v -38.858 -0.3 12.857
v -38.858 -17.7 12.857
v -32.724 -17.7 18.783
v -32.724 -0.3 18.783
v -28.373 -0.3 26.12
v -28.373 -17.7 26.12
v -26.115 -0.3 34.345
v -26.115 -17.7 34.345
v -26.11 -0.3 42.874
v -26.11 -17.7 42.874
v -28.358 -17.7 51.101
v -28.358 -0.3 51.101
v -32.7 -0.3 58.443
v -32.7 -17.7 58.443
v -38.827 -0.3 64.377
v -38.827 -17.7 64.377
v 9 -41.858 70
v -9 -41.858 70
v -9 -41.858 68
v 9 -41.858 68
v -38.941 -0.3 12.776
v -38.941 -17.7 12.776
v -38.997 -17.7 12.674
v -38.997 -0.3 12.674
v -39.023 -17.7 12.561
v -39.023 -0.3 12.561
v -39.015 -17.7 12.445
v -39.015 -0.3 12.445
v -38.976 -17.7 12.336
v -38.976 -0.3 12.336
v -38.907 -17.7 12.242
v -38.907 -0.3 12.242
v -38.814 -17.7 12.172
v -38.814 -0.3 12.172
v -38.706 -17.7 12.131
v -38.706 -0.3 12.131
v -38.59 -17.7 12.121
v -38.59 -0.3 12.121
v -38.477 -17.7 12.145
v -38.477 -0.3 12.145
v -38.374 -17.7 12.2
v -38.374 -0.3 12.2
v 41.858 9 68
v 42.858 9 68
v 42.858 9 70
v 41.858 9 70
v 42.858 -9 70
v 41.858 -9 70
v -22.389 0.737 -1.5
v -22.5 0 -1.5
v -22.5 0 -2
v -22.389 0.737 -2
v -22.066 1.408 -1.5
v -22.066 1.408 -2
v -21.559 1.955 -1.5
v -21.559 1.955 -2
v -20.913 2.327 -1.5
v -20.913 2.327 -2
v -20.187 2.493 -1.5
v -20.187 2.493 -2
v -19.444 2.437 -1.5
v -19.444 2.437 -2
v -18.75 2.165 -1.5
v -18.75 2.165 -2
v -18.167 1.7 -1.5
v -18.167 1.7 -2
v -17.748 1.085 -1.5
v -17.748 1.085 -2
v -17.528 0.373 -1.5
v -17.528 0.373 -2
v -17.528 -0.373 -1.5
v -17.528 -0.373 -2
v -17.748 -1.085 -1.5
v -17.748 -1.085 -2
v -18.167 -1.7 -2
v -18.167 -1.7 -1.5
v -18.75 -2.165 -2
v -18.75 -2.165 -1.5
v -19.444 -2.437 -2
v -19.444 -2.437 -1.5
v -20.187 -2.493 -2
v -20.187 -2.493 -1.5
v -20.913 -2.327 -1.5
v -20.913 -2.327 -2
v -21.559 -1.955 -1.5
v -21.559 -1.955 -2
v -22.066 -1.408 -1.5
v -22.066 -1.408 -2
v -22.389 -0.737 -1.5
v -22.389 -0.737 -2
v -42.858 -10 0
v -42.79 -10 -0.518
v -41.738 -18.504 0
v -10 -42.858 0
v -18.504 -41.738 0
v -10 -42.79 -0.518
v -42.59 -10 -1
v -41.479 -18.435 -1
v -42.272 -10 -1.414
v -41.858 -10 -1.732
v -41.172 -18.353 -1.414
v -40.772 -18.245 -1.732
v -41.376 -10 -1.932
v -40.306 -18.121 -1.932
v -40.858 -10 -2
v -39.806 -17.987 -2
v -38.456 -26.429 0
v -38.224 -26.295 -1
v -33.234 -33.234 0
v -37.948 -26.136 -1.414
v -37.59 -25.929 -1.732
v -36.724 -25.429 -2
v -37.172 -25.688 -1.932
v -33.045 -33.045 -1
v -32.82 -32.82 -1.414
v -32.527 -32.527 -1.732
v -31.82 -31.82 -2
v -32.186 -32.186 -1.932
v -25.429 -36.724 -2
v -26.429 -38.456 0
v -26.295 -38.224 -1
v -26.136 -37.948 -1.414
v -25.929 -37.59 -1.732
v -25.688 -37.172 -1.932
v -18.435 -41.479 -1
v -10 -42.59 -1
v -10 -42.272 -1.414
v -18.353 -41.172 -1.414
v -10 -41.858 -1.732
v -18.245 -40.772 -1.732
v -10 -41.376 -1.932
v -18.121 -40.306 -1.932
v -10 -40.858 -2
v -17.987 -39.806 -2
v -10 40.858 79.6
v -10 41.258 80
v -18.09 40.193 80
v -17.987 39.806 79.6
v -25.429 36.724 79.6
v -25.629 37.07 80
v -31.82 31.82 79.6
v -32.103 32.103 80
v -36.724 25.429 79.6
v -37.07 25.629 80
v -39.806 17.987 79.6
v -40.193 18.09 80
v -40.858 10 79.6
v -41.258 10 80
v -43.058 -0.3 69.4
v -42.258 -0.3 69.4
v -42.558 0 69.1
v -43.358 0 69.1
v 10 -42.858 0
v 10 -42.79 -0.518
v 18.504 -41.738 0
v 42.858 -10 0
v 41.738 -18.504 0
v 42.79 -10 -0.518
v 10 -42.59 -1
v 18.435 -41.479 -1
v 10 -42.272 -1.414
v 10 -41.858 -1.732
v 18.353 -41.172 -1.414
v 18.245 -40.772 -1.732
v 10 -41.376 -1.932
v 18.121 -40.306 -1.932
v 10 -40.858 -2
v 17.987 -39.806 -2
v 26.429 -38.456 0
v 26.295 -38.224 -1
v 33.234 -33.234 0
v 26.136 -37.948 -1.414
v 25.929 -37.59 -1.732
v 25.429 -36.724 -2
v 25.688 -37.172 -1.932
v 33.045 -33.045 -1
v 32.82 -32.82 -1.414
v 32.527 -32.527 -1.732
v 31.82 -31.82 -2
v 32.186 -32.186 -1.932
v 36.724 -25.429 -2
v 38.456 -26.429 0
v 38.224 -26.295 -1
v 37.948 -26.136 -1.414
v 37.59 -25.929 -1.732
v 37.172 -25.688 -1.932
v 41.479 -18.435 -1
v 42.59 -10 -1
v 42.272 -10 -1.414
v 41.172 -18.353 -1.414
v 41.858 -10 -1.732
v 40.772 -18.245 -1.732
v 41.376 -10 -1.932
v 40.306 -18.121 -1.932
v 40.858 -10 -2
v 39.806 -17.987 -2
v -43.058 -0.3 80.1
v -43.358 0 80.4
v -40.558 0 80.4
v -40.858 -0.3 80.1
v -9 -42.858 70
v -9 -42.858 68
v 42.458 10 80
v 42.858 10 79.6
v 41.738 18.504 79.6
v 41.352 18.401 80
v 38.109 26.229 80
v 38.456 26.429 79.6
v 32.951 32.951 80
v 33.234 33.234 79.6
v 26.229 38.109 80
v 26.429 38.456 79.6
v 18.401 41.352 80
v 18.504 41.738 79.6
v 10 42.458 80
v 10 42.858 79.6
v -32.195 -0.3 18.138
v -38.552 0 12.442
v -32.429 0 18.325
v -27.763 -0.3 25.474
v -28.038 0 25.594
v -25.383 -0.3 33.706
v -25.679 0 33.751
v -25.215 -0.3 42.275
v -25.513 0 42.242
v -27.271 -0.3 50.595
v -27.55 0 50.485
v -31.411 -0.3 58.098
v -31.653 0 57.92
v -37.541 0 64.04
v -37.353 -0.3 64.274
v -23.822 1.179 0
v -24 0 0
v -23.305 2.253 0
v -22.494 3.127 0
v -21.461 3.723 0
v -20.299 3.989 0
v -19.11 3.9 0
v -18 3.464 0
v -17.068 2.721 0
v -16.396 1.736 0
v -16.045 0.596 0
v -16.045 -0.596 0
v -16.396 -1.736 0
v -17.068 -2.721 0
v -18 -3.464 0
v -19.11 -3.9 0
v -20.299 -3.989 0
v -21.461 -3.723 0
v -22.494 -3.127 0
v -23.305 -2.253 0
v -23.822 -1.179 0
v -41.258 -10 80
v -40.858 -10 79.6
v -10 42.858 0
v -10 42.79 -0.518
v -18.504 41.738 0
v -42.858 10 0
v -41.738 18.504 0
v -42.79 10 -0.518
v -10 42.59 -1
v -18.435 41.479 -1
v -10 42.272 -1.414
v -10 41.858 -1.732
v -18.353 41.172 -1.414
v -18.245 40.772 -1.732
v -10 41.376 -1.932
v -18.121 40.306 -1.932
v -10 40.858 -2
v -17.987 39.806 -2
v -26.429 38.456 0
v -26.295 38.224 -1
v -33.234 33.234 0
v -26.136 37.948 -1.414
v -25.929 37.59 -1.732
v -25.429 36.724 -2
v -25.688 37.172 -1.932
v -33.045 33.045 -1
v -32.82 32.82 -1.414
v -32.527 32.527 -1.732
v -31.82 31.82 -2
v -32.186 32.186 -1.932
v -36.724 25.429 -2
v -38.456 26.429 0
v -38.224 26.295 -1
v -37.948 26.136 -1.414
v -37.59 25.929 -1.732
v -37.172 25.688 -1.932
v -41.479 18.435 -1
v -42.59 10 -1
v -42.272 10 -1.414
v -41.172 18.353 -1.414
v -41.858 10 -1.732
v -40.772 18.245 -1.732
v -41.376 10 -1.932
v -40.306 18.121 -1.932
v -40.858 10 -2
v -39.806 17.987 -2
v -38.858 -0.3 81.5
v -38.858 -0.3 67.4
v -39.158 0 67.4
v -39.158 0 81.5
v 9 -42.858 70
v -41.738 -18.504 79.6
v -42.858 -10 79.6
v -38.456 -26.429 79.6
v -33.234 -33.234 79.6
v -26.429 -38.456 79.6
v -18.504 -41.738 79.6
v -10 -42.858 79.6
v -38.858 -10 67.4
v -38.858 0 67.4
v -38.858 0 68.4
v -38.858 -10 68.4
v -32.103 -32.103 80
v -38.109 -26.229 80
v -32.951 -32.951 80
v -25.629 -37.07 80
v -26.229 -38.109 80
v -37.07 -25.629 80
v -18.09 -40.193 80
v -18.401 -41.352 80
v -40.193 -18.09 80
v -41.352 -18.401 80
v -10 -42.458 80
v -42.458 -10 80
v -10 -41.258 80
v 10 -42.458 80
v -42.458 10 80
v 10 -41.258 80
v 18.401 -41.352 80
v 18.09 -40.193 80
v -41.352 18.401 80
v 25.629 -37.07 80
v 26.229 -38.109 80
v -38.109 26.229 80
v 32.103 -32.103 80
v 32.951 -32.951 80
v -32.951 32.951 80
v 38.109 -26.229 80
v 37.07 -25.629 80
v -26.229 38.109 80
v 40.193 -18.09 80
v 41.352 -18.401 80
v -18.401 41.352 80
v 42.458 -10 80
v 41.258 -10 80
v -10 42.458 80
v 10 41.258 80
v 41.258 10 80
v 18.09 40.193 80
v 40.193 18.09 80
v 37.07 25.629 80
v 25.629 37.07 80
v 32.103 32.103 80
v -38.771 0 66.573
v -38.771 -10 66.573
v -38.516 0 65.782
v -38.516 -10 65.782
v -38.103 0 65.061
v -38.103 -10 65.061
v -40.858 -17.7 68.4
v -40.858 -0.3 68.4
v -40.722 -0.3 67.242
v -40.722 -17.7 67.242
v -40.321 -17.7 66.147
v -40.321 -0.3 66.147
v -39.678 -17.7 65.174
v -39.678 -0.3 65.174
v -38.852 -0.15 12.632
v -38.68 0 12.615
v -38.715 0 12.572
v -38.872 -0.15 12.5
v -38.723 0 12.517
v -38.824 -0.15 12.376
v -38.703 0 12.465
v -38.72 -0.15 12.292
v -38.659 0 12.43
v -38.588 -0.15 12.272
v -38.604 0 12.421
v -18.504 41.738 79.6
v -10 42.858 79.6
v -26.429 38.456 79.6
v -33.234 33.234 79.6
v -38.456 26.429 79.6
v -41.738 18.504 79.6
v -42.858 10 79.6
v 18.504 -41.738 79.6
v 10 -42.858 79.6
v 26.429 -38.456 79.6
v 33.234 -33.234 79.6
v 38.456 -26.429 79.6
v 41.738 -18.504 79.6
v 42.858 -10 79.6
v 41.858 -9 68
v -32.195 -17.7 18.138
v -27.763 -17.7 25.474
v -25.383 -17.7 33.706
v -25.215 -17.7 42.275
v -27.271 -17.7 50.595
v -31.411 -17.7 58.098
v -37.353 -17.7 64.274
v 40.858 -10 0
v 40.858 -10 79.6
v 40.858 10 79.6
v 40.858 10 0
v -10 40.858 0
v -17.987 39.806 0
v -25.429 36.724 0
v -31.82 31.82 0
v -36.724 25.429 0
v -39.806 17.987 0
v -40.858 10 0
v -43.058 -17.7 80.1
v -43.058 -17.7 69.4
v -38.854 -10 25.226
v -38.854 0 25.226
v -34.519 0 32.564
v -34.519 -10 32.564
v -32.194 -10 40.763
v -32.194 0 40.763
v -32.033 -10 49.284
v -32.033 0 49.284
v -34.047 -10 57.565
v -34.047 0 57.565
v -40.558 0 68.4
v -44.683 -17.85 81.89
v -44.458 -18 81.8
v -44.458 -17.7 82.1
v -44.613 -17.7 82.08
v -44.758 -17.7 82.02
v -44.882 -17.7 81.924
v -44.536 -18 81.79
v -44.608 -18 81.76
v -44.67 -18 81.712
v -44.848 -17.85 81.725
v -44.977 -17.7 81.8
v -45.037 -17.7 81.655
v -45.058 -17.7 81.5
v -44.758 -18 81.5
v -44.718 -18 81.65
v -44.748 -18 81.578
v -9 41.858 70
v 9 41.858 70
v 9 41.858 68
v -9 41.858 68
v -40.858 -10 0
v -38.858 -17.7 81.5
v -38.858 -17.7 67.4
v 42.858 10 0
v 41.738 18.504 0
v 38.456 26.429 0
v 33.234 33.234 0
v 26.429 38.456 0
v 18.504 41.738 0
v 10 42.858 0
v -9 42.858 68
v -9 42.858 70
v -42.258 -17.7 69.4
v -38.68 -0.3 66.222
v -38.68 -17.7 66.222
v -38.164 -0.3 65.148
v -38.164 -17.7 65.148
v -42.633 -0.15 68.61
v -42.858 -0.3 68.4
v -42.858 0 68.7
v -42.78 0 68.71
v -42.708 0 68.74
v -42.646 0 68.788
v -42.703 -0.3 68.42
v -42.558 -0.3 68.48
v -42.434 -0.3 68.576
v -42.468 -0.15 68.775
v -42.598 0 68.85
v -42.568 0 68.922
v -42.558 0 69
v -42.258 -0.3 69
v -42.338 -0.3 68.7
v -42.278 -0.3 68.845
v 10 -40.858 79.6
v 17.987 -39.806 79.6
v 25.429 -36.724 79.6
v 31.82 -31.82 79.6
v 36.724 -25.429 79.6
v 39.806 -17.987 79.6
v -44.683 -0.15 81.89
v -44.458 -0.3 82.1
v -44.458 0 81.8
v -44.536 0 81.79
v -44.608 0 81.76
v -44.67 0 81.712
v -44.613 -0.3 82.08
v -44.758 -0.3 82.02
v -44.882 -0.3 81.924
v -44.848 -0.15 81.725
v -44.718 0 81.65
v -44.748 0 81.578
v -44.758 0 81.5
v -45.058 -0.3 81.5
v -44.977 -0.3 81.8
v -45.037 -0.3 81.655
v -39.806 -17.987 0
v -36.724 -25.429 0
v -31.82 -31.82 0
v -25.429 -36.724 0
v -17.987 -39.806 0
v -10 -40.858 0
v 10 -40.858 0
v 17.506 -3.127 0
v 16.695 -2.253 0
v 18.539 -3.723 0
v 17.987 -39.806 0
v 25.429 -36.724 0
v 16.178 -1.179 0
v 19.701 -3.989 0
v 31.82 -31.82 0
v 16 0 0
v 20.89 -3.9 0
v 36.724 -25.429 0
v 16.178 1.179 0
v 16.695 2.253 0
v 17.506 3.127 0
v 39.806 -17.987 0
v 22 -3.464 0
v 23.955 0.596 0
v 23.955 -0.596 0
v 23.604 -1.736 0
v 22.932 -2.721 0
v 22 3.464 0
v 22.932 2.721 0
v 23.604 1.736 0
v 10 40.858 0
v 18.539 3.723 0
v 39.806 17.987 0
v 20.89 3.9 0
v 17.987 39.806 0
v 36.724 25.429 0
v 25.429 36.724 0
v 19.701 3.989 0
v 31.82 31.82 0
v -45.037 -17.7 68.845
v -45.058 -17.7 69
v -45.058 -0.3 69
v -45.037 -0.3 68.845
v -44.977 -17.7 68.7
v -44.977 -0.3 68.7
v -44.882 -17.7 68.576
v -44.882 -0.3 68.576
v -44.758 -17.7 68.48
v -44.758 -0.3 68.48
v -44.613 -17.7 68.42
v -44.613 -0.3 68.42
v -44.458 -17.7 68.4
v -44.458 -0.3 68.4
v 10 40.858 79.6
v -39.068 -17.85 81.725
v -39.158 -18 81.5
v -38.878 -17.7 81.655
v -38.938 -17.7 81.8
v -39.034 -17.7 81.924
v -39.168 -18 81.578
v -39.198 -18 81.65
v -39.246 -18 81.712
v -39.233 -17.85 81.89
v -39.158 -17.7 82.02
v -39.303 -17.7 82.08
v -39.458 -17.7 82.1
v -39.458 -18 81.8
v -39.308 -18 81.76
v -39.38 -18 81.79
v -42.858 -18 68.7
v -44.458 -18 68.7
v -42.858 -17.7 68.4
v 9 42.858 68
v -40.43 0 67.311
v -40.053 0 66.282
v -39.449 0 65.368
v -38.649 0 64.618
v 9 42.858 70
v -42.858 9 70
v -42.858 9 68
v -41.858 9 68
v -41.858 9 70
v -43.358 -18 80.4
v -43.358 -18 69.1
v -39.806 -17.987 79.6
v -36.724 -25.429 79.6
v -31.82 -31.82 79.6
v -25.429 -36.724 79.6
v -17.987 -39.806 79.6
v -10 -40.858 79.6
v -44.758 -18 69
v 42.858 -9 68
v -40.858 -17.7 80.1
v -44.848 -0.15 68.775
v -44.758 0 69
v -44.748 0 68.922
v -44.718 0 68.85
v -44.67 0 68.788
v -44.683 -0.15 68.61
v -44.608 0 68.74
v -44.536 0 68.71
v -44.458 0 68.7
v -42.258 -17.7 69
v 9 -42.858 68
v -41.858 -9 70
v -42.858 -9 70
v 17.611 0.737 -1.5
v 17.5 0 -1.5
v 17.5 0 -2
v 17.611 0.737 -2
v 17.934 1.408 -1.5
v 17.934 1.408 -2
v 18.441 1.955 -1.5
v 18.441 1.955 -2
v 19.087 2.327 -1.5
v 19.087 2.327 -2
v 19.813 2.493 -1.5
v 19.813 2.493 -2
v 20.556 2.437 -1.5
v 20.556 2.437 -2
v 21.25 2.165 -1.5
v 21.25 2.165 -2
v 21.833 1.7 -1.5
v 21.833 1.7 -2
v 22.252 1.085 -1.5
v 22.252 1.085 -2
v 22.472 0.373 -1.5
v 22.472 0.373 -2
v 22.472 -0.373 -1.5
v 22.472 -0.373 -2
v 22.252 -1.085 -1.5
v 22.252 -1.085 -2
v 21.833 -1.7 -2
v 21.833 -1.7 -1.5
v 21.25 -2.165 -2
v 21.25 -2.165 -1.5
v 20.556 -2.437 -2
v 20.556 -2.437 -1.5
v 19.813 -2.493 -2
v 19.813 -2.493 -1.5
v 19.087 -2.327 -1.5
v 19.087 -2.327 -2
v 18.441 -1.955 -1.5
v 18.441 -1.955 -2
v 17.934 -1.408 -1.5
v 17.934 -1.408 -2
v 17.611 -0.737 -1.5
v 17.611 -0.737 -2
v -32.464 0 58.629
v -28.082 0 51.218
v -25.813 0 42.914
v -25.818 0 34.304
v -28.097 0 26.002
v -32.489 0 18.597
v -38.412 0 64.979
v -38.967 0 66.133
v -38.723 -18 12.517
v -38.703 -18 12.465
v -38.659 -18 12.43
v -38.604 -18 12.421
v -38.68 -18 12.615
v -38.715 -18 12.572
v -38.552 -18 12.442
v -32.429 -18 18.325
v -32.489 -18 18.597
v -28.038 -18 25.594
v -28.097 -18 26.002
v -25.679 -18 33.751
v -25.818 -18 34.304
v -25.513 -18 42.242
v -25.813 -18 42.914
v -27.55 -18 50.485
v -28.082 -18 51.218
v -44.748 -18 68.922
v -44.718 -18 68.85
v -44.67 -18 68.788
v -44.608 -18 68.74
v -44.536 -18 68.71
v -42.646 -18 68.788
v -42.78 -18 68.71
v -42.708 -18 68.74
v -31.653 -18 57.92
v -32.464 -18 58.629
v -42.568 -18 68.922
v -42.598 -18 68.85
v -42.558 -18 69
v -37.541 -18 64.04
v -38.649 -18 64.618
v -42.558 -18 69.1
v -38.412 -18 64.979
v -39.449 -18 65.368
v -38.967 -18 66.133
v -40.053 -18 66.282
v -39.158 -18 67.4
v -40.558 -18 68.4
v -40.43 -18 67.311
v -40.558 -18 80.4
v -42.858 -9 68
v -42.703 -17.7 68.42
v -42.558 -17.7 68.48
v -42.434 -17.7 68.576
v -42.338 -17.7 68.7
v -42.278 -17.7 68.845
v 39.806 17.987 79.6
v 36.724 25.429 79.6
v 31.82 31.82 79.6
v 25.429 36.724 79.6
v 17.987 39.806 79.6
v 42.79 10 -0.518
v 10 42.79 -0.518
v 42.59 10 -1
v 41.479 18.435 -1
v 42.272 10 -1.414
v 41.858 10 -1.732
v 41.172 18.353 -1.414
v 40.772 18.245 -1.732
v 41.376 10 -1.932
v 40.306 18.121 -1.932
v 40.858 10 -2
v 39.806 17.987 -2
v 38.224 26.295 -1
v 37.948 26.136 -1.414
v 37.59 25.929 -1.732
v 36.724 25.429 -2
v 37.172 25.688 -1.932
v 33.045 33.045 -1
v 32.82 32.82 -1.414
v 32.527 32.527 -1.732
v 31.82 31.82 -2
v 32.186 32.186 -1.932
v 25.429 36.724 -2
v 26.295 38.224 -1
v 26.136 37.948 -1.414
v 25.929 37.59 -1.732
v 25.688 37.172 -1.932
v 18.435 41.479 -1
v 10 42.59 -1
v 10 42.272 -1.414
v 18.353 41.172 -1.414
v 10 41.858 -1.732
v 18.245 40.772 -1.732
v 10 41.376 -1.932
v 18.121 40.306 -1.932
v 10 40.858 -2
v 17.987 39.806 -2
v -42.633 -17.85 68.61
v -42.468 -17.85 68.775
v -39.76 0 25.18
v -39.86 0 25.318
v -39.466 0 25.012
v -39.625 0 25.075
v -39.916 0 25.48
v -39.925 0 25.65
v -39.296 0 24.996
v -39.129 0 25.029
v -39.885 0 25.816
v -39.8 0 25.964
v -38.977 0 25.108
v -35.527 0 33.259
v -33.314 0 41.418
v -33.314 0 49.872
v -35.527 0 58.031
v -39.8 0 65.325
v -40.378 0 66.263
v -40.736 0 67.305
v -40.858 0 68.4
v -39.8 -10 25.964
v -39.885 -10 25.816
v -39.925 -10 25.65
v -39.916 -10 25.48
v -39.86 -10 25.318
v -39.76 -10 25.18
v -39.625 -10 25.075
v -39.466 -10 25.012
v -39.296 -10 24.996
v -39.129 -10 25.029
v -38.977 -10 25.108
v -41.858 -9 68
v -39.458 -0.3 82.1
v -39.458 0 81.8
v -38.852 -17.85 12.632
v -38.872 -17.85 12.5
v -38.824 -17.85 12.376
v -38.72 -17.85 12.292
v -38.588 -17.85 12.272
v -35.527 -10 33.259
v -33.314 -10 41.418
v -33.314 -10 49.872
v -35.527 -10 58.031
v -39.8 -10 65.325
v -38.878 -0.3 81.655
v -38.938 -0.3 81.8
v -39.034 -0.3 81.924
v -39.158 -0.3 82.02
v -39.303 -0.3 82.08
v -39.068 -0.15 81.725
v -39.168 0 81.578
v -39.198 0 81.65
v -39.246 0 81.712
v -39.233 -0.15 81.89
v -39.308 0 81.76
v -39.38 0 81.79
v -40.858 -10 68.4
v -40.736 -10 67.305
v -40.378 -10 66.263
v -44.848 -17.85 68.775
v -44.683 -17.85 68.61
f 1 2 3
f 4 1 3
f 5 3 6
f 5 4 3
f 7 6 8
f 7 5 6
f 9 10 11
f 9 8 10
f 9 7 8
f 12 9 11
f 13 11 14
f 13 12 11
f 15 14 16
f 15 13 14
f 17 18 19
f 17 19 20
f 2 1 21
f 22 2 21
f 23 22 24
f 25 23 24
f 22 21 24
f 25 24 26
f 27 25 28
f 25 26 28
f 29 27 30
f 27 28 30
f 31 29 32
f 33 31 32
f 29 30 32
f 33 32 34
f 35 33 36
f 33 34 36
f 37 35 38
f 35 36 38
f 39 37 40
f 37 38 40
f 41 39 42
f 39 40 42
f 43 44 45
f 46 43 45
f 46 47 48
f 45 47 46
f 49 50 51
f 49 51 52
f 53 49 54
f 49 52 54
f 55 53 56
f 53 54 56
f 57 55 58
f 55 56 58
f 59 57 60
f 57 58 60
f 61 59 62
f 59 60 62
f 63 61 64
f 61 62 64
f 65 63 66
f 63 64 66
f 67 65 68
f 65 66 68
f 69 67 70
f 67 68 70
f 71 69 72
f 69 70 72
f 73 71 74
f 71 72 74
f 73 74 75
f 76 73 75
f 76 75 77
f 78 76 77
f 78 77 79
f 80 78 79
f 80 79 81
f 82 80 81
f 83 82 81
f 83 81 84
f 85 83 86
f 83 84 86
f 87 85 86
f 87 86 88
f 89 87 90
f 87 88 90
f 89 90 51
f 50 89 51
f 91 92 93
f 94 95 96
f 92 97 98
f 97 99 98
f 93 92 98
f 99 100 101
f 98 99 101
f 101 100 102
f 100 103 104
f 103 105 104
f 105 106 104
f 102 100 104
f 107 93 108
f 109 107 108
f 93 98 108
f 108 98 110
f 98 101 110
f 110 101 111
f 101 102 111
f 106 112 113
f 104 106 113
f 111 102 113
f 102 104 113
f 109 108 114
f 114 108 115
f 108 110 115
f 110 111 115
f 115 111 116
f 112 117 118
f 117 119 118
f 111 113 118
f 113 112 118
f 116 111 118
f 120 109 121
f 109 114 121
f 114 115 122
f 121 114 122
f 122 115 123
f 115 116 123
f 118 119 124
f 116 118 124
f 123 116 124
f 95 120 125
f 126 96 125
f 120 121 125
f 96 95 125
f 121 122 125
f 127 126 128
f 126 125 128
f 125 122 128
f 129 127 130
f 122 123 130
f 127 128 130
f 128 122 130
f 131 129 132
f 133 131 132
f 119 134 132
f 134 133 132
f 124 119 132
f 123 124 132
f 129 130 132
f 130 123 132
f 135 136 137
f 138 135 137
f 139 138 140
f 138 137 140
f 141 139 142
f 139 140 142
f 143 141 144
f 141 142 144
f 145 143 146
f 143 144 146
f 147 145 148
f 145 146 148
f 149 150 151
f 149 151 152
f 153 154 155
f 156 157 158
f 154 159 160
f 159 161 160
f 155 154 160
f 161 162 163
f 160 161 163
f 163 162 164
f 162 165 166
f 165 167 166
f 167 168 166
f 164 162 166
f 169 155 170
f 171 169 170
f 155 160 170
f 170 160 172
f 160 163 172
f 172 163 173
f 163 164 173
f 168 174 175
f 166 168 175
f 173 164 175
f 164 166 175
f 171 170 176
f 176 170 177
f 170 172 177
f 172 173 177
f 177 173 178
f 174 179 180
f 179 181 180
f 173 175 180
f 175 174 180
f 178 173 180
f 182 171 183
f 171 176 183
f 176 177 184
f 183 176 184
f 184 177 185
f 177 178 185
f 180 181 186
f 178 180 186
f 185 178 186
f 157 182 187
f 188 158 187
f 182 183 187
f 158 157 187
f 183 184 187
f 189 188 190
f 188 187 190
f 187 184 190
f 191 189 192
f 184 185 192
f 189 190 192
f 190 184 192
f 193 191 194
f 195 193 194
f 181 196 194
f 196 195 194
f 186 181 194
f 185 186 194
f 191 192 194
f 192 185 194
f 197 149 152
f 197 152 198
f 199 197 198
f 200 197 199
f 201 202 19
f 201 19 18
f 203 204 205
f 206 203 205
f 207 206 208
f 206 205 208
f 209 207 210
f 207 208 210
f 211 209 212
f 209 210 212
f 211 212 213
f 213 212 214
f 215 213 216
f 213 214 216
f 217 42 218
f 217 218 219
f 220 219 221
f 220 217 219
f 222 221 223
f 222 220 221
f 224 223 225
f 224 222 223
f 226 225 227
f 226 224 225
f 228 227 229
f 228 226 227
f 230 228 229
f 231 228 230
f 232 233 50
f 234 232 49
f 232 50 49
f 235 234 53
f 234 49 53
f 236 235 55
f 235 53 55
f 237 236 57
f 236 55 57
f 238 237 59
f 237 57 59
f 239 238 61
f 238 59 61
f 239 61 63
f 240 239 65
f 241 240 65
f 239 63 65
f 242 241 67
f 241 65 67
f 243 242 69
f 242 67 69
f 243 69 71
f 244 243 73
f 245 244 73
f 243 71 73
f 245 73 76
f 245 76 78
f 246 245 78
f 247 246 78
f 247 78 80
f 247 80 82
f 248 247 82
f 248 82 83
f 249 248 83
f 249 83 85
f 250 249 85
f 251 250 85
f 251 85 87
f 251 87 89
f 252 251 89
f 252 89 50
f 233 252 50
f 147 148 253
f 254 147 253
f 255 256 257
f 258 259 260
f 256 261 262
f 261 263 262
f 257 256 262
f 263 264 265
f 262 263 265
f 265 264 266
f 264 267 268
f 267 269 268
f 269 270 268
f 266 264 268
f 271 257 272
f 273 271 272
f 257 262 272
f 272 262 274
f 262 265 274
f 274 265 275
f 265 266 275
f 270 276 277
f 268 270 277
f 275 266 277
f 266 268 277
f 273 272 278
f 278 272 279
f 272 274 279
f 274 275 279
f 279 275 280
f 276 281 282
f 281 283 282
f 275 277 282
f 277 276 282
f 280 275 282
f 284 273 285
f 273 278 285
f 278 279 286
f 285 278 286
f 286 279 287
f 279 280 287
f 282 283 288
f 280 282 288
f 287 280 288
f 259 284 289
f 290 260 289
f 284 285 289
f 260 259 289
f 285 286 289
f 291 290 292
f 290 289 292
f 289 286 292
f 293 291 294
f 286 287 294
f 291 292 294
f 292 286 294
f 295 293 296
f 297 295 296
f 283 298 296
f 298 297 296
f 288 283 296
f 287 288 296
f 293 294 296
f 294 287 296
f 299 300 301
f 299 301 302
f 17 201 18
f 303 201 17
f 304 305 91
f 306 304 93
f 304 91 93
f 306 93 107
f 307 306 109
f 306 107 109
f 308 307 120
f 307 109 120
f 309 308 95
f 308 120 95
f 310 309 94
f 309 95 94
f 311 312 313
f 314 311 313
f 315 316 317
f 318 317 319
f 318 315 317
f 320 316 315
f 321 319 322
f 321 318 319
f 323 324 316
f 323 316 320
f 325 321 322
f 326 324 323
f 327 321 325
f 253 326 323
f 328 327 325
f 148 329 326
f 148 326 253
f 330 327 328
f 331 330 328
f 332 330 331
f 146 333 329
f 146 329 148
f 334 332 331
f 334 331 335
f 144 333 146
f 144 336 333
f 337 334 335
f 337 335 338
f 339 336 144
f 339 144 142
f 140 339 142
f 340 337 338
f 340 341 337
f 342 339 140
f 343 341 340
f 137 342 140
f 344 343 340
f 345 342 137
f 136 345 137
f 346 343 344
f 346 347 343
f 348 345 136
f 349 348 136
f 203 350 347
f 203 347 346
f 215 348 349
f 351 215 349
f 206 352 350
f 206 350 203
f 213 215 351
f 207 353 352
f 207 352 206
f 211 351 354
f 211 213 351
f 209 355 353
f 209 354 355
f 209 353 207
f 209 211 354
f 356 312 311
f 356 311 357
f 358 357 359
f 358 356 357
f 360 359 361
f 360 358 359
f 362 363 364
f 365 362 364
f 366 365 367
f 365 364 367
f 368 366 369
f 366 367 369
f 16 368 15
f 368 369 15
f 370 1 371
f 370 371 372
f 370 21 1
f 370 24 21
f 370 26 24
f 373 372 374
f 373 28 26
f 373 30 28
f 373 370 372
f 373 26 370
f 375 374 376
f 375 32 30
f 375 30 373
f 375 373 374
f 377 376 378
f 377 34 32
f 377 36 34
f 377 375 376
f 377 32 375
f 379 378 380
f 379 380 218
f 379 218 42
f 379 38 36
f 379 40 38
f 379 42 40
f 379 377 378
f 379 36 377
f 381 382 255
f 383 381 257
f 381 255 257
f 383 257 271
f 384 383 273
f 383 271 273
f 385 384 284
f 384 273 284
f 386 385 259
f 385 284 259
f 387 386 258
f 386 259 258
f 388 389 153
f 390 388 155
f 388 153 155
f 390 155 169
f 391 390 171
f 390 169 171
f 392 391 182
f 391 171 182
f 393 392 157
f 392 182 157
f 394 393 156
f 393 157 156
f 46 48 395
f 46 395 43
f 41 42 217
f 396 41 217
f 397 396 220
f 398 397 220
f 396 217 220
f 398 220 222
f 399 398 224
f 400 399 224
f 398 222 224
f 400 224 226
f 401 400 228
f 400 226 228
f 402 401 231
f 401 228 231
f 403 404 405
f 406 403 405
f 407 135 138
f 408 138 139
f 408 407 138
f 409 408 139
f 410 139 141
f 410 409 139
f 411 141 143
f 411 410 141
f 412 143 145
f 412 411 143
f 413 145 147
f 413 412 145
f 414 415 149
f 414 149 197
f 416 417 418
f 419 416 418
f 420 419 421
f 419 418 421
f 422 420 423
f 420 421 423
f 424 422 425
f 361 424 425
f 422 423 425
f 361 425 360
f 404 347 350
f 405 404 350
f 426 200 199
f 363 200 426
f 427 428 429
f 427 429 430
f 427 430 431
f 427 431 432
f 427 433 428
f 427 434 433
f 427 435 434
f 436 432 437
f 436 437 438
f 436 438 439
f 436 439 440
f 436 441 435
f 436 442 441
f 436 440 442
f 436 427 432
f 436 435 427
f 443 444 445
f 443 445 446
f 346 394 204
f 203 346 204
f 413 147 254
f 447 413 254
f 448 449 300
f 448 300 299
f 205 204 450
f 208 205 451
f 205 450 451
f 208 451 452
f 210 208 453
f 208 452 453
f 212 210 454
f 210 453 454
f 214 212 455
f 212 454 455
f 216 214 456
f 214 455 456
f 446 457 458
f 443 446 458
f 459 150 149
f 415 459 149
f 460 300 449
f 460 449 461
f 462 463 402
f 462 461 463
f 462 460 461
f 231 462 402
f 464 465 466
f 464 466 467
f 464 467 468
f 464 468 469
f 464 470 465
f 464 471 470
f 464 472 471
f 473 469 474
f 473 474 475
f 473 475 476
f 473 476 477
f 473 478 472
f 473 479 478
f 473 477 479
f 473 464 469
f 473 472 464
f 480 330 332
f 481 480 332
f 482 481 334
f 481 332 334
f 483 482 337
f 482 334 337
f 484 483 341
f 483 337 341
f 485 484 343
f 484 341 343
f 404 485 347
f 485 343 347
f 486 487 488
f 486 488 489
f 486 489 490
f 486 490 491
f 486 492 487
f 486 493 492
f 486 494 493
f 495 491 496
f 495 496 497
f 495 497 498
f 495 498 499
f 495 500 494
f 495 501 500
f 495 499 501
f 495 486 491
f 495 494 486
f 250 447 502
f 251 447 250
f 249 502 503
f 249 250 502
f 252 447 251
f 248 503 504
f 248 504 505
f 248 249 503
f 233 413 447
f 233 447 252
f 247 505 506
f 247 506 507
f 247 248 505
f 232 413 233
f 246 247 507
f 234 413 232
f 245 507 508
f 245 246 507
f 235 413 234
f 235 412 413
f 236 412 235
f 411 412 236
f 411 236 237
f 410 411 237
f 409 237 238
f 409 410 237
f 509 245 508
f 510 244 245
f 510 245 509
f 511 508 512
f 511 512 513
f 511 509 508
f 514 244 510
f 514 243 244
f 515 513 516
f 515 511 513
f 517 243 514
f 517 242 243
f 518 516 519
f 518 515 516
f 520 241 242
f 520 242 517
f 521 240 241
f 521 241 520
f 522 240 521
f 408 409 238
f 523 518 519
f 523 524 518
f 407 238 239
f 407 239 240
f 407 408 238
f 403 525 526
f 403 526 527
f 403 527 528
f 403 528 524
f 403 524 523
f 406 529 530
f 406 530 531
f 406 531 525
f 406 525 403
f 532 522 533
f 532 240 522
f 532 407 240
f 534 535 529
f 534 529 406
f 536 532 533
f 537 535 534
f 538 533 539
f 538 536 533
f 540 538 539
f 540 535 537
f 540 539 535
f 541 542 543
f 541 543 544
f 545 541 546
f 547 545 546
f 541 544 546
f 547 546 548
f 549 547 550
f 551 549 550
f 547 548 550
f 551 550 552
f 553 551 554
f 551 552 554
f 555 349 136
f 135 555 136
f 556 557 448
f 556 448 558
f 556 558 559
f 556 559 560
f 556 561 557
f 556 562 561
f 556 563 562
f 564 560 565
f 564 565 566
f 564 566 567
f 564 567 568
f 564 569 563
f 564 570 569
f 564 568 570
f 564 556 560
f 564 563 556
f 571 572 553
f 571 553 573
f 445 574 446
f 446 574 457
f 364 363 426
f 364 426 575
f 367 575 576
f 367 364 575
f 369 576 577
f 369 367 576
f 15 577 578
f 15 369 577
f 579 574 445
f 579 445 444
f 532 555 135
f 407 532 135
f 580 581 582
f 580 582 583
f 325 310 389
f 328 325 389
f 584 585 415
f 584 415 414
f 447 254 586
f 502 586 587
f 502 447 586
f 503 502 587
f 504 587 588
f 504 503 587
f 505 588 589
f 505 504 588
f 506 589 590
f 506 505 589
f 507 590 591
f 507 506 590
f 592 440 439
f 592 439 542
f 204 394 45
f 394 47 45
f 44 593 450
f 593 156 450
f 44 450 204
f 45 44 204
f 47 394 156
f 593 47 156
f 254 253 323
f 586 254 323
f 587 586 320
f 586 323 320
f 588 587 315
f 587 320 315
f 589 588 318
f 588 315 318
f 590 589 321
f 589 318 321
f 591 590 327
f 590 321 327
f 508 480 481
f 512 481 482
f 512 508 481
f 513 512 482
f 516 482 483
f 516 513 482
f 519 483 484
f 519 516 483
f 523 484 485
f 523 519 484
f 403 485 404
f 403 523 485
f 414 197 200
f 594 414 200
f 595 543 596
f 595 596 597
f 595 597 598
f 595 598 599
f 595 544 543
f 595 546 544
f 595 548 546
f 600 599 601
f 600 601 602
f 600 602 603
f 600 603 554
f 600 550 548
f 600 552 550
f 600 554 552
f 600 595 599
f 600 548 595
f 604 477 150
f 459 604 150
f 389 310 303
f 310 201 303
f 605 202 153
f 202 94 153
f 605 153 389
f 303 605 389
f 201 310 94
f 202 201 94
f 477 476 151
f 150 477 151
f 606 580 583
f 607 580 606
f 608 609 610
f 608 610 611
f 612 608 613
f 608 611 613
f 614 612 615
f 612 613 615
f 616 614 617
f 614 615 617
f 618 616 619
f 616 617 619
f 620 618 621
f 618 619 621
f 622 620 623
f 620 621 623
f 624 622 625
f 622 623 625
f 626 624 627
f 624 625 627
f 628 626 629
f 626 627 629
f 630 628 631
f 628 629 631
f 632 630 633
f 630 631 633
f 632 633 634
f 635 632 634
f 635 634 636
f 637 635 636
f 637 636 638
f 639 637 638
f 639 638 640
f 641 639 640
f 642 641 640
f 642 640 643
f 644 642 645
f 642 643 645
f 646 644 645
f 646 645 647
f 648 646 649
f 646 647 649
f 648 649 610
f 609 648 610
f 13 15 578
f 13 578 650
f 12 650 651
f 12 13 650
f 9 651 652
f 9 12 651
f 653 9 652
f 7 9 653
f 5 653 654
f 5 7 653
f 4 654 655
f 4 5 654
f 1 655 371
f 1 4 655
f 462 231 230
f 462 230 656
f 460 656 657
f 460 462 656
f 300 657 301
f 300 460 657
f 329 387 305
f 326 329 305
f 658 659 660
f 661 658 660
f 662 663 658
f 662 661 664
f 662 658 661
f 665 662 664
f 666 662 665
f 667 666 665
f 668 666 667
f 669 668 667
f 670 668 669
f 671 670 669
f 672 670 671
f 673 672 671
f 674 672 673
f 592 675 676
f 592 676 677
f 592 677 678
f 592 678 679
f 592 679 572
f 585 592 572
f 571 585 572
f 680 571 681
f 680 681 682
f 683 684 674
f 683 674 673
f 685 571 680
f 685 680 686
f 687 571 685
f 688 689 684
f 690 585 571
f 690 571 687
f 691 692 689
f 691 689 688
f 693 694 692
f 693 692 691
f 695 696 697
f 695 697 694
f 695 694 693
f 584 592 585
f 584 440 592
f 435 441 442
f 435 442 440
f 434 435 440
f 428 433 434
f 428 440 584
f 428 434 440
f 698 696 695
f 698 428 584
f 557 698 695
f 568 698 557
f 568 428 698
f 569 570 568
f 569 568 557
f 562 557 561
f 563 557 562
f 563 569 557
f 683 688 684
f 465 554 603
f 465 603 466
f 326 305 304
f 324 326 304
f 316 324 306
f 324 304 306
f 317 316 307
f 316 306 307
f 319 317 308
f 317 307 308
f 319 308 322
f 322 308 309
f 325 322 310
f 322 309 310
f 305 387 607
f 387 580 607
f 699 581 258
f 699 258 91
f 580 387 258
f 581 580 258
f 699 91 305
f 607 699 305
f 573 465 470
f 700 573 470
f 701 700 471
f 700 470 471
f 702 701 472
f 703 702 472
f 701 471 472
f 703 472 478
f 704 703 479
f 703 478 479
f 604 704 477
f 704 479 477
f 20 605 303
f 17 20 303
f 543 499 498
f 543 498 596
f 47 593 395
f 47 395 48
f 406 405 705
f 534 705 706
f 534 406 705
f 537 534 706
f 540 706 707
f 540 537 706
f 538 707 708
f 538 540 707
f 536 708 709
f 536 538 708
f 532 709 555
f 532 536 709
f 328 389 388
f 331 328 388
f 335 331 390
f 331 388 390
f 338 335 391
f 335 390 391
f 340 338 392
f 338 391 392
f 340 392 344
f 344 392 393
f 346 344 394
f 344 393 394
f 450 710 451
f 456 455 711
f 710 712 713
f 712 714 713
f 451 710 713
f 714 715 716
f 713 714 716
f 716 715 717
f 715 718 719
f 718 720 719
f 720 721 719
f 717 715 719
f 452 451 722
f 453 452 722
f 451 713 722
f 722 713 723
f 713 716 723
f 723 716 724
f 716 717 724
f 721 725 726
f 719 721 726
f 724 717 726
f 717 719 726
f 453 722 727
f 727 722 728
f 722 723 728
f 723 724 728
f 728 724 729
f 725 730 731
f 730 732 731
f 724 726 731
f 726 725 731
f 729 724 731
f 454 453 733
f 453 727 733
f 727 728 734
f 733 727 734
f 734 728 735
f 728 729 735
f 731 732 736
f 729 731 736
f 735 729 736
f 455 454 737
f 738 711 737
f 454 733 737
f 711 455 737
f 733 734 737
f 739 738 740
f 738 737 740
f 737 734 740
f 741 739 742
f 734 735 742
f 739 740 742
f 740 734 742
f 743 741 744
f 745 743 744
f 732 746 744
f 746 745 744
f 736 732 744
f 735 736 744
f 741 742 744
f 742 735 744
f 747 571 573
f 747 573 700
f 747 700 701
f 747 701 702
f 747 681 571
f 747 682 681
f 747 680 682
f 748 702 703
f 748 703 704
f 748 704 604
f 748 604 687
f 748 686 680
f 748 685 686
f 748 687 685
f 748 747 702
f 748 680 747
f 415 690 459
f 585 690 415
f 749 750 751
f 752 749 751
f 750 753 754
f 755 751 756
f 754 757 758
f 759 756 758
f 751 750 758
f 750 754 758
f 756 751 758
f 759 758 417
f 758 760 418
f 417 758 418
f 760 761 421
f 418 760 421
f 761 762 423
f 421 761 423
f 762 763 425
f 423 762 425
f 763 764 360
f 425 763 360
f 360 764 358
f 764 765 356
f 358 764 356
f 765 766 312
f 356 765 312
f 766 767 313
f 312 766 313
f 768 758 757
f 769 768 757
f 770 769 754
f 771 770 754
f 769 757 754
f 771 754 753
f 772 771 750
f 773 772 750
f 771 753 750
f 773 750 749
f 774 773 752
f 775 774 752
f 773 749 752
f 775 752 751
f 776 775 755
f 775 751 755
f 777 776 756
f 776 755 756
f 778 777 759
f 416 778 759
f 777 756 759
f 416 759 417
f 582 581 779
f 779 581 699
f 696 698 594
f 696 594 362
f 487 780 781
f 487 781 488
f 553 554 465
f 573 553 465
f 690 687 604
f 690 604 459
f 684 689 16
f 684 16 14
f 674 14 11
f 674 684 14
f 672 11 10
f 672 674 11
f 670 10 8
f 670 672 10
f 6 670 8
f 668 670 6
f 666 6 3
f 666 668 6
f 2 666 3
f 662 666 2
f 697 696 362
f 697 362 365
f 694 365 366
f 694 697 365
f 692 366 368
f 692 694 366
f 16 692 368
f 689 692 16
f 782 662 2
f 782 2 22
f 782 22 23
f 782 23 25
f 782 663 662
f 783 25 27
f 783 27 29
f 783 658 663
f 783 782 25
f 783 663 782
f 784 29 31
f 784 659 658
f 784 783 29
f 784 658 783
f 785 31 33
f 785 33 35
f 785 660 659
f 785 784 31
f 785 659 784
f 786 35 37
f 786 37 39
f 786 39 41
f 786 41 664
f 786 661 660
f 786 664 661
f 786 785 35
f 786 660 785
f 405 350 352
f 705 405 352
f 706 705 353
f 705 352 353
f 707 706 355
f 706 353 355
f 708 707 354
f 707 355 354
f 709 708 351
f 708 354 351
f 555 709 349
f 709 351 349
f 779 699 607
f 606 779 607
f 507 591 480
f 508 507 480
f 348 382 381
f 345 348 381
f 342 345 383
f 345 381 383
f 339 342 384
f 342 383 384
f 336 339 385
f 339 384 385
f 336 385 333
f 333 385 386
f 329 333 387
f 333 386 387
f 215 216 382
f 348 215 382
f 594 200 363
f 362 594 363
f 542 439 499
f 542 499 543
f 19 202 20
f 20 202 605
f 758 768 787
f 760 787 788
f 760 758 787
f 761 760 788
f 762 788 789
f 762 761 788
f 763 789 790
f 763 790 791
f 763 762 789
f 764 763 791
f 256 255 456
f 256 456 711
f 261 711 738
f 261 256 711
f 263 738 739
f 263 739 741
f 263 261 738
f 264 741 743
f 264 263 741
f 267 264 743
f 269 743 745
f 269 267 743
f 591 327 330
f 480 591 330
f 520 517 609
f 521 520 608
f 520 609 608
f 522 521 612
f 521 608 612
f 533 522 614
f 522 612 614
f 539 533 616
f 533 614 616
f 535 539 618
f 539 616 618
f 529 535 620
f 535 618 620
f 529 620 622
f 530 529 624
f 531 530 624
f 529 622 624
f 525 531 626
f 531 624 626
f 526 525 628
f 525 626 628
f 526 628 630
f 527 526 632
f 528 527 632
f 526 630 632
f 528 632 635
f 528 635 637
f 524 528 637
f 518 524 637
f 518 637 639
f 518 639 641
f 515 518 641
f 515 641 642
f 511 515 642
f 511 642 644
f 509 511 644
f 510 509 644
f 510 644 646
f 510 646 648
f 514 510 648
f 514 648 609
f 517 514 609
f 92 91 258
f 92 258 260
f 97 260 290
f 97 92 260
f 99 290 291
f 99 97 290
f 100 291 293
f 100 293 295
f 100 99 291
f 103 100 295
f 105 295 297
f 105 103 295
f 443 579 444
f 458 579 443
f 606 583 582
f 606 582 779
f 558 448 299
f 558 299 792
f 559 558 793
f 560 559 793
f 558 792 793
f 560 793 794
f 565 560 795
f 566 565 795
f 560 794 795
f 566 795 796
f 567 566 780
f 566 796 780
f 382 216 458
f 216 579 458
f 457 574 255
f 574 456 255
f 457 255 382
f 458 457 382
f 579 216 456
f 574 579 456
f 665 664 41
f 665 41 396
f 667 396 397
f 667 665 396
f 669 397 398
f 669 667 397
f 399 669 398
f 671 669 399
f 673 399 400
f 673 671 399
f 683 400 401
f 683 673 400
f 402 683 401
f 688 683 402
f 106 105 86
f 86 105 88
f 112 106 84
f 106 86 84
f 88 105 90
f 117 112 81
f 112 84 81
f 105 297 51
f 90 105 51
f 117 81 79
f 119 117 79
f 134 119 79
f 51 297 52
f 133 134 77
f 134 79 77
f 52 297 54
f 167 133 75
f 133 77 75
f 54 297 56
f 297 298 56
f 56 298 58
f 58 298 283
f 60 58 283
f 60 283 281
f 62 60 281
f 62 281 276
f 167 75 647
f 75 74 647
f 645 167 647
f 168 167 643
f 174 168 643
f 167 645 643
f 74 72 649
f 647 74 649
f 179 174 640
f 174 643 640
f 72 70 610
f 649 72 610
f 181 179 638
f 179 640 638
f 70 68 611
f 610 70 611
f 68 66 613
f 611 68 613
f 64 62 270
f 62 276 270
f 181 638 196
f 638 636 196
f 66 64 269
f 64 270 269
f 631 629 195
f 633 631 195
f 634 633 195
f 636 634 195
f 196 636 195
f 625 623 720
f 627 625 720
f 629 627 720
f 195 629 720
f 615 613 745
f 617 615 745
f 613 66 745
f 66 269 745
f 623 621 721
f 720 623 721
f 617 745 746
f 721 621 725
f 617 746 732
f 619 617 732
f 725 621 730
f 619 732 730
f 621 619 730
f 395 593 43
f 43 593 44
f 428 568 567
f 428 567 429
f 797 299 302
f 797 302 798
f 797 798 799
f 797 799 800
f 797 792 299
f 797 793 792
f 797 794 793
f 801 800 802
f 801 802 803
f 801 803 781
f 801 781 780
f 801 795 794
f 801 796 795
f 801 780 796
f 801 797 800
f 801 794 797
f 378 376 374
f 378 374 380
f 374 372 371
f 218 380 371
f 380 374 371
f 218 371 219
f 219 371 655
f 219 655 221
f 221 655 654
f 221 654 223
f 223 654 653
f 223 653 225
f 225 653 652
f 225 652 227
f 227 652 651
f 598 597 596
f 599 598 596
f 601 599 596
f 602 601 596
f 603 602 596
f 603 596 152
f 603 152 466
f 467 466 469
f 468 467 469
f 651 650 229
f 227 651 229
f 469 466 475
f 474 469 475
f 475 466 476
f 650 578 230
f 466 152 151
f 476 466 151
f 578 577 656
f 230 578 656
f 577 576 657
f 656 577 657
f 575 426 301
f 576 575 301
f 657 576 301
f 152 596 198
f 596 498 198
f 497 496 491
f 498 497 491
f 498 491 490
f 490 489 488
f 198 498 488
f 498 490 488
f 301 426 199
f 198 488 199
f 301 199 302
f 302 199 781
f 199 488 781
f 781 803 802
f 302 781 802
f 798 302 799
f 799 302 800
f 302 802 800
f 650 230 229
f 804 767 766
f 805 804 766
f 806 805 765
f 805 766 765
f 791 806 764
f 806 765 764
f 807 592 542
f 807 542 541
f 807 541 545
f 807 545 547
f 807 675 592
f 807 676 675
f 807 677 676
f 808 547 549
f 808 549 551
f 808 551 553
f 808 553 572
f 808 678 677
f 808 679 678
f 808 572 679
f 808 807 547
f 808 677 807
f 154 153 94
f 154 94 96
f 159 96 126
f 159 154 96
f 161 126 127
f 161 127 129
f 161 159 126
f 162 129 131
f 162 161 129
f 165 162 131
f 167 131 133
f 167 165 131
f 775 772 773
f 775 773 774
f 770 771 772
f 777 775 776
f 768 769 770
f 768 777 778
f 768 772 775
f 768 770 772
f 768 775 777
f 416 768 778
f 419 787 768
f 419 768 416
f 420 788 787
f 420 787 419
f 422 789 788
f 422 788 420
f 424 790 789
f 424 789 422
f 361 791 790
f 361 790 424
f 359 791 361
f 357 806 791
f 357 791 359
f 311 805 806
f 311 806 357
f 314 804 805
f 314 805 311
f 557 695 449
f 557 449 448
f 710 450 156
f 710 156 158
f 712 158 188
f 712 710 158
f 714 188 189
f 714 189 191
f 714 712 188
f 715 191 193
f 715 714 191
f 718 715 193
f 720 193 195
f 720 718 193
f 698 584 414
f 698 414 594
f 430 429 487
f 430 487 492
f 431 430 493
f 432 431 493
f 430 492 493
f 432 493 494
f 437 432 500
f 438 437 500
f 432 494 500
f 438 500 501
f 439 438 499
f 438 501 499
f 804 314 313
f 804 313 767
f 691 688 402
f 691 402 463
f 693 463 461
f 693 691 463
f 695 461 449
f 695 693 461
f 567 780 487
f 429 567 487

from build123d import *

# Parameters (mm, degrees)
PAD_DEPTH          = 80
THICKNESS_T        = 2
SKETCH001_W        = 18
SKETCH001_H        = 2
POCKET_DEPTH       = 1
POLARPATTERN_COUNT = 4
HOLE_D             = 5
HOLE_DEPTH         = 25
HOLE_CSINK_D       = 8
HOLE_CSINK_ANGLE   = 90
CHAMFER001_SIZE    = 0.4
PAD001_DEPTH       = 18
PAD003_DEPTH       = 18
CHAMFER_SIZE       = 0.3
PAD002_DEPTH       = 10


with BuildPart() as body:
    # Sketch → Pad (new body)
    with BuildSketch(Plane.XY):
        with BuildLine():
            Line((-40.857864, 10), (-40.857864, -10))
            ThreePointArc((-40.857864, -10), (-31.819805, -31.819805), (-10, -40.857864))
            Line((-10, -40.857864), (10, -40.857864))
            ThreePointArc((10, -40.857864), (31.819805, -31.819805), (40.857864, -10))
            Line((40.857864, -10), (40.857864, 10))
            ThreePointArc((40.857864, 10), (31.819805, 31.819805), (10, 40.857864))
            Line((10, 40.857864), (-10, 40.857864))
            ThreePointArc((-10, 40.857864), (-31.819805, 31.819805), (-40.857864, 10))
        make_face()
    extrude(amount=PAD_DEPTH)

    # Thickness
    thickness_openings = [body.faces().sort_by_distance(p)[0] for p in [
        (0, 0, 80),
    ]]
    offset(amount=THICKNESS_T, openings=thickness_openings)

    # Sketch001 (on Face13 of Thickness) → Pocket (cut)
    with BuildSketch(Plane.XZ.offset(42.857864)):
        with Locations((0, 69)):
            Rectangle(SKETCH001_W, SKETCH001_H)
    pocket = extrude(amount=-POCKET_DEPTH, mode=Mode.SUBTRACT)

    # PolarPattern: Pocket ×4 about axis
    polarpattern_axis = Axis((0, 0, 0), (0, 0, 1))
    for i in range(1, POLARPATTERN_COUNT):
        add(pocket.rotate(polarpattern_axis, i * 360 / POLARPATTERN_COUNT), mode=Mode.SUBTRACT)

    # Hole
    with Locations(Plane.XY):
        with Locations((-20, 0), (20, 0)):
            CounterSinkHole(HOLE_D / 2, HOLE_CSINK_D / 2, depth=HOLE_DEPTH, counter_sink_angle=HOLE_CSINK_ANGLE)

    # Chamfer001
    chamfer001_edges = [body.edges().sort_by_distance(p)[0] for p in [
        (-40.857864, 0, 80),
        (-31.819805, 31.819805, 80),
        (0, 40.857864, 80),
        (31.819805, 31.819805, 80),
        (40.857864, 0, 80),
        (31.819805, -31.819805, 80),
        (0, -40.857864, 80),
        (-31.819805, -31.819805, 80),
        (0, 42.857864, 80),
        (-33.234019, 33.234019, 80),
        (-42.857864, 0, 80),
        (-33.234019, -33.234019, 80),
        (0, -42.857864, 80),
        (33.234019, -33.234019, 80),
        (42.857864, 0, 80),
        (33.234019, 33.234019, 80),
    ]]
    chamfer(chamfer001_edges, length=CHAMFER001_SIZE)


with BuildPart() as wing:
    # Sketch002 → Pad001 (new body)
    with BuildSketch(Plane.XZ):
        with BuildLine():
            Line((-45.057864, 81.5), (-45.057864, 69))
            ThreePointArc((-45.057864, 69), (-44.882128, 68.575736), (-44.457864, 68.4))
            Line((-44.457864, 68.4), (-42.857864, 68.4))
            ThreePointArc((-42.857864, 68.4), (-42.4336, 68.575736), (-42.257864, 69))
            Line((-42.257864, 69), (-42.257864, 69.4))
            Line((-42.257864, 69.4), (-43.057864, 69.4))
            Line((-43.057864, 69.4), (-43.057864, 80.1))
            Line((-43.057864, 80.1), (-40.857864, 80.1))
            Line((-40.857864, 80.1), (-40.857864, 68.4))
            Line((-40.857864, 68.4), (-38.857864, 68.4))
            Line((-38.857864, 68.4), (-38.857864, 81.5))
            ThreePointArc((-38.857864, 81.5), (-39.0336, 81.924264), (-39.457864, 82.1))
            Line((-39.457864, 82.1), (-44.457864, 82.1))
            ThreePointArc((-44.457864, 82.1), (-44.882128, 81.924264), (-45.057864, 81.5))
        make_face()
    extrude(amount=PAD001_DEPTH)

    # Sketch003 → Pad003 (join)
    with BuildSketch(Plane(origin=(0, 0, 0.2), x_dir=(1, 0, 0), z_dir=(0, -1, 0))):
        with BuildLine():
            Line((-38.857864, 67.2), (-38.857864, 68.2))
            Line((-38.857864, 68.2), (-40.857864, 68.2))
            ThreePointArc((-40.857864, 68.2), (-40.321277, 65.94657), (-38.826685, 64.176805))
            ThreePointArc((-38.857864, 12.656924), (-25.827146, 38.408988), (-38.826685, 64.176805))
            ThreePointArc((-38.857864, 12.656924), (-38.944559, 12.086695), (-38.37433, 12))
            ThreePointArc((-38.37433, 12), (-25.017751, 37.785152), (-37.353461, 64.07398))
            ThreePointArc((-38.857864, 67.2), (-38.462194, 65.465409), (-37.353461, 64.07398))
        make_face()
    extrude(amount=PAD003_DEPTH)

    # Chamfer
    chamfer_edges = [wing.edges().sort_by_distance(p)[0] for p in [
        (-45.057864, -18, 75.25),
        (-44.882128, -18, 68.575736),
        (-43.657864, -18, 68.4),
        (-42.4336, -18, 68.575736),
        (-42.257864, -18, 69.2),
        (-42.657864, -18, 69.4),
        (-43.057864, -18, 74.75),
        (-41.957864, -18, 80.1),
        (-40.857864, -18, 74.25),
        (-40.321277, -18, 66.14657),
        (-25.827146, -18, 38.608988),
        (-38.944559, -18, 12.286695),
        (-25.017751, -18, 37.985152),
        (-38.462194, -18, 65.665409),
        (-38.857864, -18, 74.45),
        (-39.0336, -18, 81.924264),
        (-41.957864, -18, 82.1),
        (-44.882128, -18, 81.924264),
        (-45.057864, 0, 75.25),
        (-44.882128, 0, 81.924264),
        (-41.957864, 0, 82.1),
        (-39.0336, 0, 81.924264),
        (-38.857864, 0, 74.45),
        (-38.462194, 0, 65.665409),
        (-25.017751, 0, 37.985152),
        (-38.944559, 0, 12.286695),
        (-25.827146, 0, 38.608988),
        (-40.321277, 0, 66.14657),
        (-40.857864, 0, 74.25),
        (-41.957864, 0, 80.1),
        (-43.057864, 0, 74.75),
        (-42.657864, 0, 69.4),
        (-42.257864, 0, 69.2),
        (-42.4336, 0, 68.575736),
        (-43.657864, 0, 68.4),
        (-44.882128, 0, 68.575736),
    ]]
    chamfer(chamfer_edges, length=CHAMFER_SIZE)


with BuildPart() as body002:
    # Sketch004 → Pad002 (new body)
    with BuildSketch(Plane.XZ):
        with BuildLine():
            Line((-38.857864, 67.4), (-38.857864, 68.4))
            Line((-38.857864, 68.4), (-40.857864, 68.4))
            ThreePointArc((-40.857864, 68.4), (-40.586132, 66.77412), (-39.80047, 65.324962))
            ThreePointArc((-39.80047, 25.964473), (-33.033147, 45.644717), (-39.80047, 65.324962))
            ThreePointArc((-39.80047, 25.964473), (-39.696362, 25.122356), (-38.854245, 25.226464))
            ThreePointArc((-38.854245, 25.226464), (-31.839057, 45.0183), (-38.102518, 65.060722))
            ThreePointArc((-38.857864, 67.4), (-38.664347, 66.170898), (-38.102518, 65.060722))
        make_face()
    extrude(amount=PAD002_DEPTH)


solid = Compound([body.part, wing.part, body002.part])
